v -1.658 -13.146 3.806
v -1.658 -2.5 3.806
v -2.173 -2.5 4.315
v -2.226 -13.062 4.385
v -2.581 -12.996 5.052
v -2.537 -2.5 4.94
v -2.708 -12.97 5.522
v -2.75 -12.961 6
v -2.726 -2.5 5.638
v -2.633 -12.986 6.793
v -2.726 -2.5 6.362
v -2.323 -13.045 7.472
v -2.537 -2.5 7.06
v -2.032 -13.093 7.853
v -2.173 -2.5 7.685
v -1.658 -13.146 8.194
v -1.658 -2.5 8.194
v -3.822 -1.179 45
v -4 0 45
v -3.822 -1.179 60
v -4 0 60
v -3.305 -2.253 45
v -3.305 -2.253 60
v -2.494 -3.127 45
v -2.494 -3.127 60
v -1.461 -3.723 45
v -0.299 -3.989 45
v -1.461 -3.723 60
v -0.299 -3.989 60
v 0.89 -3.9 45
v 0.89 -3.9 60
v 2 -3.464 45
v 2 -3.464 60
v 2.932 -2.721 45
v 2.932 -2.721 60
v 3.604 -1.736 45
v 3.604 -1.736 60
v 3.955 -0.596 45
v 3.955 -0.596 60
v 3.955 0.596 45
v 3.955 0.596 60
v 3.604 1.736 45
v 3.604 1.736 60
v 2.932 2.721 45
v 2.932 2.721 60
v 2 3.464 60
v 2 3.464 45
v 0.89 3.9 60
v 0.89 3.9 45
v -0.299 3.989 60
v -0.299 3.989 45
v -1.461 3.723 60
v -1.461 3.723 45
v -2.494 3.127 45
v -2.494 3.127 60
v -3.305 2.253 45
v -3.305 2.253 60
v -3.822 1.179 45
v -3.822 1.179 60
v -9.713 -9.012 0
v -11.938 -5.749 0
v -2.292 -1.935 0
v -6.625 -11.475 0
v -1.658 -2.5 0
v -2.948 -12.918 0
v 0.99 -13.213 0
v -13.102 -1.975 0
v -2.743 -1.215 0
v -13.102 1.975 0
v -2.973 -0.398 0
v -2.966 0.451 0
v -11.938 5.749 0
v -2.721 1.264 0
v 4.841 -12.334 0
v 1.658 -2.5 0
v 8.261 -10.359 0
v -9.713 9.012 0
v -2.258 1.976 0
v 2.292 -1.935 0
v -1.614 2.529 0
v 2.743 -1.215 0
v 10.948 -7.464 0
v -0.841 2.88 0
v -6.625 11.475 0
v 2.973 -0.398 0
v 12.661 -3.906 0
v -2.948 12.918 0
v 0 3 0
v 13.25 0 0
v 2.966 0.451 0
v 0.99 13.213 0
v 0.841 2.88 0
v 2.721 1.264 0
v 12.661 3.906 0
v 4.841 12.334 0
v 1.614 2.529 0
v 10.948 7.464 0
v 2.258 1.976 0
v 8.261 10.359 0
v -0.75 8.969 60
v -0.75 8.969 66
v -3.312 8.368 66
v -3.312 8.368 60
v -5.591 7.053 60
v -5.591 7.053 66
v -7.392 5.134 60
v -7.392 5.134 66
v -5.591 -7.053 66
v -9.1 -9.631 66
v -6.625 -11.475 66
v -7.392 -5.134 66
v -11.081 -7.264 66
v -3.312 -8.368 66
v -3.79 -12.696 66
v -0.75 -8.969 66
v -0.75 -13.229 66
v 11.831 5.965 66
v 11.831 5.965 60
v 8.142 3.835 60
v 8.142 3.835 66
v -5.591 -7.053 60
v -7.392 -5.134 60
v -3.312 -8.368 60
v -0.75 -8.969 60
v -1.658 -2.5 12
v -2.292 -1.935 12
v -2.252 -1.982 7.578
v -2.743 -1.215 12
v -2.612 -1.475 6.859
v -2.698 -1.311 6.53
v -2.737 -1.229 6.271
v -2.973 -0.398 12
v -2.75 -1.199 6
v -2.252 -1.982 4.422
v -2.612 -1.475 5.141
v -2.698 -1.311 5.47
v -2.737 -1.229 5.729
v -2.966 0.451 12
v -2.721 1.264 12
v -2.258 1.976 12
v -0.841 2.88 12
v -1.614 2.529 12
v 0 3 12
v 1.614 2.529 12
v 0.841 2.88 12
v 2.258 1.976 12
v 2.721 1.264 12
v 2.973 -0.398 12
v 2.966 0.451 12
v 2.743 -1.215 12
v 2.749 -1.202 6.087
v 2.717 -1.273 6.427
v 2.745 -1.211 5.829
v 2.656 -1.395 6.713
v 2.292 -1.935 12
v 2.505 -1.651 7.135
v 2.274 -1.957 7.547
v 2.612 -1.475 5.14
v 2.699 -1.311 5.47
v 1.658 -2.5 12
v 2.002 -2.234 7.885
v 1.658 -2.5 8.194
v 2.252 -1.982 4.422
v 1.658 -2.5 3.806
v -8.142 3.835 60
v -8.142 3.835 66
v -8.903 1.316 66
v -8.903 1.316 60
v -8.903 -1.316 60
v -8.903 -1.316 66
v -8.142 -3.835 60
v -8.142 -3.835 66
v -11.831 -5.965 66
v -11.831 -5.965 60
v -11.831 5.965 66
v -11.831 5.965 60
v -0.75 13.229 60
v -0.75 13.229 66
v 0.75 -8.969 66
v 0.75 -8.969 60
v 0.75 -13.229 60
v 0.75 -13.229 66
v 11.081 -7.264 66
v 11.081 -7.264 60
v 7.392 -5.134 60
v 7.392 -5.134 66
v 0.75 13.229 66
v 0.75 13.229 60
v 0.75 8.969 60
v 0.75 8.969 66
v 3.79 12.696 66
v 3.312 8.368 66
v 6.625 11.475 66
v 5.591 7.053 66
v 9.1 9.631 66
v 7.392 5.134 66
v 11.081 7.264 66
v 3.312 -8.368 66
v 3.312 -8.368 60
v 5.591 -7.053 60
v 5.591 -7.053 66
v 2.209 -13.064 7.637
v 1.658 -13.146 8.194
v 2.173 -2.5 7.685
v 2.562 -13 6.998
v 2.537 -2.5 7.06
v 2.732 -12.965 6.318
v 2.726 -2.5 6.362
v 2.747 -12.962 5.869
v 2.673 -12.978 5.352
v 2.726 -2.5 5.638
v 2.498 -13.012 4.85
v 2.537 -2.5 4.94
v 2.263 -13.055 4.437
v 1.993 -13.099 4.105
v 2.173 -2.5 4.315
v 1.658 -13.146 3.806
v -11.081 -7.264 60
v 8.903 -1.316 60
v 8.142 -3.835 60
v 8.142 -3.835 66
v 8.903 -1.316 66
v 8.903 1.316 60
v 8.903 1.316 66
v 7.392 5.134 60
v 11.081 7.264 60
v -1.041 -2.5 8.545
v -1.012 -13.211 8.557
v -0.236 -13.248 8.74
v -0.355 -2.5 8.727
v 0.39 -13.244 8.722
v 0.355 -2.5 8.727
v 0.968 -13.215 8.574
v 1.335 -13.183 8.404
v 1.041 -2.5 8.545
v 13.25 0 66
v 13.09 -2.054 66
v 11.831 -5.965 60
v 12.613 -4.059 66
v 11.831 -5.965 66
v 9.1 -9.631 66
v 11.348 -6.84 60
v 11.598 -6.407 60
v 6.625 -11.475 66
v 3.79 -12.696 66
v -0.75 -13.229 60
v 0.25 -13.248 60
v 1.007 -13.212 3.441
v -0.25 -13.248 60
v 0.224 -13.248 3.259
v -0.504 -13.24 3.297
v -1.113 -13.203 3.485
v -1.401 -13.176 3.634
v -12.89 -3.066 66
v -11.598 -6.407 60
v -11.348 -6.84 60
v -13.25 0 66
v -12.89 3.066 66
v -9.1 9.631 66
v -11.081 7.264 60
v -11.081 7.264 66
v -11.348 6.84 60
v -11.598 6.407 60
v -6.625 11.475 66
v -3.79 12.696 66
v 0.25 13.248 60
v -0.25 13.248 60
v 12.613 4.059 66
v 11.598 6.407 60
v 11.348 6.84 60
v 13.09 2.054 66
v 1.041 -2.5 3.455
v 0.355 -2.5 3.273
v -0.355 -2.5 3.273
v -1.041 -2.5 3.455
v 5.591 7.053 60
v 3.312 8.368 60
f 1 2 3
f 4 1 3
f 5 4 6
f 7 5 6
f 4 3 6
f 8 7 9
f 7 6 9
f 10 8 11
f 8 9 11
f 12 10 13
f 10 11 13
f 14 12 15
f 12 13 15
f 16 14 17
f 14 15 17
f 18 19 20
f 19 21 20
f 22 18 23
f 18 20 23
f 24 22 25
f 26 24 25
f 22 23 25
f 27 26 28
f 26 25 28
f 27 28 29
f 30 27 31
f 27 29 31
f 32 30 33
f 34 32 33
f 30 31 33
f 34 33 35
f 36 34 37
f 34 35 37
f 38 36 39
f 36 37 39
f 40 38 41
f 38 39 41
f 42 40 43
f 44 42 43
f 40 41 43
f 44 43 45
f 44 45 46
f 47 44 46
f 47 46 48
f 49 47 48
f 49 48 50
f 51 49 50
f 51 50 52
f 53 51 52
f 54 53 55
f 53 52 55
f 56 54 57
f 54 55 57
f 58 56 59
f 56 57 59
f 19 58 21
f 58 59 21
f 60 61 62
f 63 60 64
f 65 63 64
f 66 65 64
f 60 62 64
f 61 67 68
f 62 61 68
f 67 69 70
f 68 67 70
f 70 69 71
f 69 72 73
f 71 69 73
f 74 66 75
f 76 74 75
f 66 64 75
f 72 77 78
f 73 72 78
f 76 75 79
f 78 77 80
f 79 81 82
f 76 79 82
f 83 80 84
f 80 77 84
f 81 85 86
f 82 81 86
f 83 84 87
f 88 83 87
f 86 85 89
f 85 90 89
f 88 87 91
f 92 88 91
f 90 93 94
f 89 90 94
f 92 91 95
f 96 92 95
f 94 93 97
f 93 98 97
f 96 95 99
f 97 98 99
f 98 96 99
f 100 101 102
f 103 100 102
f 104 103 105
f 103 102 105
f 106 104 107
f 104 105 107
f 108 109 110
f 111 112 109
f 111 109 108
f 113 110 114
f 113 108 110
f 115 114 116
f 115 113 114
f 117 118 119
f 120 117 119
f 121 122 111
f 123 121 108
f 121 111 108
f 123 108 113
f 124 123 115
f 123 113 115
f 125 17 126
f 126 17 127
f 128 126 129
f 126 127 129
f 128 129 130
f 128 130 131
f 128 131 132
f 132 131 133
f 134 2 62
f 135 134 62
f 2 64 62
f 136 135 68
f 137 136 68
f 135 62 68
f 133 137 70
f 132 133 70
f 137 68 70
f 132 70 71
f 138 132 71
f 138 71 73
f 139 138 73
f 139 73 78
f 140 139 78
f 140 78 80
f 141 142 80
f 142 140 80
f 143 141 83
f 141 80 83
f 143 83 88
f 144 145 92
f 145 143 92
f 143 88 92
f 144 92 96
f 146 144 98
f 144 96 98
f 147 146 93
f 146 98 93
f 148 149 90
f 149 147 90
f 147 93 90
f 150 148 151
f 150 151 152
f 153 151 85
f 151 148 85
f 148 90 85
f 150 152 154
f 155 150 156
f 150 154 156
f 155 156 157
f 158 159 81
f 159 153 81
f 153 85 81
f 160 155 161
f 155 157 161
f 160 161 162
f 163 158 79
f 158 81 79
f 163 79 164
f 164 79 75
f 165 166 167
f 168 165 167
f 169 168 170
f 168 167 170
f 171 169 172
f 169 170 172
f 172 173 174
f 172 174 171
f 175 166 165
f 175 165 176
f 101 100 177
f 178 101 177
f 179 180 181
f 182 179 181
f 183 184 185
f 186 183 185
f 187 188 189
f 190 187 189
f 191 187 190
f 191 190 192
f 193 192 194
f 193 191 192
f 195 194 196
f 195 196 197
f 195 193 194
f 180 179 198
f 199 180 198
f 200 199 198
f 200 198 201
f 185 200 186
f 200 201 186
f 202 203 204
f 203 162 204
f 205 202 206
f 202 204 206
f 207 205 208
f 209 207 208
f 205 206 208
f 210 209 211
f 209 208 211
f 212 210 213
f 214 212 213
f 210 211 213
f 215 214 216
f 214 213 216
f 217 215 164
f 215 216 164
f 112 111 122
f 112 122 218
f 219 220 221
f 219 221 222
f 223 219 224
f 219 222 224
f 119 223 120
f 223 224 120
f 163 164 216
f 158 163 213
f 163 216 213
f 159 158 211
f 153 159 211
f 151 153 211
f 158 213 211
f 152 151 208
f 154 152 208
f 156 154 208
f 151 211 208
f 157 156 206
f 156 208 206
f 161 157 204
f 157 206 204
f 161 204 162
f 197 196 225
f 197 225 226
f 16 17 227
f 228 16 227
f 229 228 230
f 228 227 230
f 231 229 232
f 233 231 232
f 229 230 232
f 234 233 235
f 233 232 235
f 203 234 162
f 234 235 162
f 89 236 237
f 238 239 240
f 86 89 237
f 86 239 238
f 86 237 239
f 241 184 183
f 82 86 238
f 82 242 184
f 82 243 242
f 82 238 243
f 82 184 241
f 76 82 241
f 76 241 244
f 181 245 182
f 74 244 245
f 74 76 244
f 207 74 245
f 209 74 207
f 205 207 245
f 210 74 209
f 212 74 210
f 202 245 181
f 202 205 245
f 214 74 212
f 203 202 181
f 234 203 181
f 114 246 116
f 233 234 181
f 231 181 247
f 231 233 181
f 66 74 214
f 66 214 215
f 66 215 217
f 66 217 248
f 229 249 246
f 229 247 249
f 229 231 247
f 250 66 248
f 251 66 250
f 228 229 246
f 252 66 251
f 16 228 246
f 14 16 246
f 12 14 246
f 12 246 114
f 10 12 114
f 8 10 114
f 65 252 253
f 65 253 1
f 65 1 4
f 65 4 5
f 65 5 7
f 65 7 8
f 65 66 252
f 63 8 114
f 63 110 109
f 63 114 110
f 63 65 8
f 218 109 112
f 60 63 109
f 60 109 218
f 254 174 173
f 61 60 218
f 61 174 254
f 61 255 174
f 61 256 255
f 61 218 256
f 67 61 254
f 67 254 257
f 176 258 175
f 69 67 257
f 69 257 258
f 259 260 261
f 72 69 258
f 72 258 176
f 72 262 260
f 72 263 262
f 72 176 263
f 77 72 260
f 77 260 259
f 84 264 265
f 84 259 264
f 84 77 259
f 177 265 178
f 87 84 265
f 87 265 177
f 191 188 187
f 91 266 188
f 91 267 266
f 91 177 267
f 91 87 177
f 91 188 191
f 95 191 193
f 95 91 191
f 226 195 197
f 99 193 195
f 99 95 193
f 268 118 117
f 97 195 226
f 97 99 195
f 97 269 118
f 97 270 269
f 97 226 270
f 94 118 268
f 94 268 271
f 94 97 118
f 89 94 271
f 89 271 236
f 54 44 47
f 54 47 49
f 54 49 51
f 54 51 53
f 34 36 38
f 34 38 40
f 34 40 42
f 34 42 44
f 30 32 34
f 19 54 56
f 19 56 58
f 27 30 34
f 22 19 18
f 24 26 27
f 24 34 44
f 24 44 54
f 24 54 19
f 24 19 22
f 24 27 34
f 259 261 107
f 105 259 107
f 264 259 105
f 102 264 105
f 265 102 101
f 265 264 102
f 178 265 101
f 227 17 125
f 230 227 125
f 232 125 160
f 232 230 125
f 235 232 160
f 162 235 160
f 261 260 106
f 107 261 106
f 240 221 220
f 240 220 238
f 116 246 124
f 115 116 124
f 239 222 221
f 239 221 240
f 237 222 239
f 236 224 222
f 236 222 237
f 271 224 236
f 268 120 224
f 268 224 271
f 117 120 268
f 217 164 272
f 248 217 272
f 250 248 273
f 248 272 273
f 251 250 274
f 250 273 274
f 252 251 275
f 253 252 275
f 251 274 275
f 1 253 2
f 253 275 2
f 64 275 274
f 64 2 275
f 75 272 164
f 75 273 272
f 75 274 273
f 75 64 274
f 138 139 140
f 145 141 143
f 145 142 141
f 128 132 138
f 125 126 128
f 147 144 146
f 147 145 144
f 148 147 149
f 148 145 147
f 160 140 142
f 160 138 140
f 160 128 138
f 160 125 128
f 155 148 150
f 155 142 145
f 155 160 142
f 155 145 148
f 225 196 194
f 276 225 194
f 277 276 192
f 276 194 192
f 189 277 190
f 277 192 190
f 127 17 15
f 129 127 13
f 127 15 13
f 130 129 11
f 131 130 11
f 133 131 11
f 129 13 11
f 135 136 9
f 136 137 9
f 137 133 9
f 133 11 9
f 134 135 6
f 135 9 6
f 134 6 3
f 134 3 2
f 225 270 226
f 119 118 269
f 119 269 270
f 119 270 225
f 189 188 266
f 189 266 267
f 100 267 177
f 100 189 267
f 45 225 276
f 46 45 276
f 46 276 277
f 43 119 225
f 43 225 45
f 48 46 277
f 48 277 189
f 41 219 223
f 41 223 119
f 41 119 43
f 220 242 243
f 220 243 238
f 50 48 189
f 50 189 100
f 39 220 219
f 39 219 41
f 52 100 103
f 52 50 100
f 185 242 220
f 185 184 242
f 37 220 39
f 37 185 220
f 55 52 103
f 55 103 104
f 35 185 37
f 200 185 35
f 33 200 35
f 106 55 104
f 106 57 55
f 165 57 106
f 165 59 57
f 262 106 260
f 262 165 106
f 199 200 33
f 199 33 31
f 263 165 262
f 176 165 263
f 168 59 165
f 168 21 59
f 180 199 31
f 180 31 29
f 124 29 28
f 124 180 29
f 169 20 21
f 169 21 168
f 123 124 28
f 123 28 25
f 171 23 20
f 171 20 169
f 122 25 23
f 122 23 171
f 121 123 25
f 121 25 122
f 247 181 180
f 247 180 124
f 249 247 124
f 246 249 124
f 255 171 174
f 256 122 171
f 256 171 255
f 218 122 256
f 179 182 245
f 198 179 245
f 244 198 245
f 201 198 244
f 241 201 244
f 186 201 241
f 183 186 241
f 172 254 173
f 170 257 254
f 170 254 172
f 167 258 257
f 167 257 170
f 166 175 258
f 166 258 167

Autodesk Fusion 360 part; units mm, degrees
sketch "Skizze1" plane through (0, 0, 0) normal (0, 0, 1) x (1, 0, 0)
  circle A0 centre (0, 0) radius 13.25
  dimension "d1" = 26.5
extrude "Extrusion1" add sketch "Skizze1" along normal blind 66
sketch "Skizze2" plane through (0, 0, 66) normal (0, 0, 1) x (-1, 0, 0)
  circle A0 centre (0, 0) radius 13.25
  circle A1 centre (0, 0) radius 9
  line L0 (0.75, -14.5) -> (-0.75, -14.5)
  line L1 (-0.75, -14.5) -> (-0.75, -8.5)
  line L2 (-0.75, -8.5) -> (0.75, -8.5)
  line L3 (0.75, -8.5) -> (0.75, -14.5)
  line L4 (12.1824, -7.8995) -> (6.9862, -4.8995)
  line L5 (12.9324, -6.6005) -> (12.1824, -7.8995)
  line L6 (7.7362, -3.6005) -> (12.9324, -6.6005)
  line L7 (6.9862, -4.8995) -> (7.7362, -3.6005)
  line L8 (12.9324, 6.6005) -> (7.7362, 3.6005)
  line L9 (12.1824, 7.8995) -> (12.9324, 6.6005)
  line L10 (6.9862, 4.8995) -> (12.1824, 7.8995)
  line L11 (7.7362, 3.6005) -> (6.9862, 4.8995)
  line L12 (0.75, 14.5) -> (0.75, 8.5)
  line L13 (-0.75, 14.5) -> (0.75, 14.5)
  line L14 (-0.75, 8.5) -> (-0.75, 14.5)
  line L15 (0.75, 8.5) -> (-0.75, 8.5)
  line L16 (-12.1824, 7.8995) -> (-6.9862, 4.8995)
  line L17 (-12.9324, 6.6005) -> (-12.1824, 7.8995)
  line L18 (-7.7362, 3.6005) -> (-12.9324, 6.6005)
  line L19 (-6.9862, 4.8995) -> (-7.7362, 3.6005)
  line L20 (-12.9324, -6.6005) -> (-7.7362, -3.6005)
  line L21 (-12.1824, -7.8995) -> (-12.9324, -6.6005)
  line L22 (-6.9862, -4.8995) -> (-12.1824, -7.8995)
  line L23 (-7.7362, -3.6005) -> (-6.9862, -4.8995)
  dimension "d4" = 18
  dimension "d5" = 1.5
  dimension "d6" = 6
  dimension "d7" = 0.75
  dimension "d8" = 8.5
  dimension "d10" = 360
extrude "Extrusion2" cut sketch "Skizze2" against normal blind 6 contours A0 A1 L8 L10 | A0 A1 L4 L6 | A1 L8 L10 L11 | A1 L1 L2 L3 L4 L6 L7 L8 L10 L11 L12 L14 L15 L16 L18 L19 L20 L22 L23 | A1 L4 L6 L7 | A0 A1 L12 L14 | A0 A1 L1 L3 | A1 L12 L14 L15 | A1 L1 L2 L3 | A0 A1 L16 L18 | A0 A1 L20 L22 | A1 L16 L18 L19 | A1 L20 L22 L23
sketch "Skizze3" plane through (0, 0, 60) normal (0, 0, 1) x (-1, 0, 0)
  arc A0 (-11.8314, -5.9649) -> (-11.0814, -7.2639) centre (0, 0) ccw
  line L0 (-11.0814, -7.2639) -> (-7.3921, -5.1339)
  arc A1 (-7.3921, -5.1339) -> (-0.75, -8.9687) centre (0, 0) ccw
  line L1 (-0.75, -8.9687) -> (-0.75, -13.2288)
  arc A2 (-0.75, -13.2288) -> (0.75, -13.2288) centre (0, 0) ccw
  line L2 (0.75, -13.2288) -> (0.75, -8.9687)
  arc A3 (0.75, -8.9687) -> (7.3921, -5.1339) centre (0, 0) ccw
  line L3 (7.3921, -5.1339) -> (11.0814, -7.2639)
  arc A4 (11.0814, -7.2639) -> (11.8314, -5.9649) centre (0, 0) ccw
  line L4 (11.8314, -5.9649) -> (8.1421, -3.8348)
  arc A5 (8.1421, -3.8348) -> (8.1421, 3.8348) centre (0, 0) ccw
  line L5 (8.1421, 3.8348) -> (11.8314, 5.9649)
  arc A6 (11.8314, 5.9649) -> (11.0814, 7.2639) centre (0, 0) ccw
  line L6 (11.0814, 7.2639) -> (7.3921, 5.1339)
  arc A7 (7.3921, 5.1339) -> (0.75, 8.9687) centre (0, 0) ccw
  line L7 (0.75, 8.9687) -> (0.75, 13.2288)
  arc A8 (0.75, 13.2288) -> (-0.75, 13.2288) centre (0, 0) ccw
  line L8 (-0.75, 13.2288) -> (-0.75, 8.9687)
  arc A9 (-0.75, 8.9687) -> (-7.3921, 5.1339) centre (0, 0) ccw
  line L9 (-7.3921, 5.1339) -> (-11.0814, 7.2639)
  arc A10 (-11.0814, 7.2639) -> (-11.8314, 5.9649) centre (0, 0) ccw
  line L10 (-11.8314, 5.9649) -> (-8.1421, 3.8348)
  arc A11 (-8.1421, 3.8348) -> (-8.1421, -3.8348) centre (0, 0) ccw
  line L11 (-8.1421, -3.8348) -> (-11.8314, -5.9649)
  circle A12 centre (0, 0) radius 4
  dimension "d13" = 8
extrude "Extrusion3" cut sketch "Skizze3" against normal blind 15 contours A12
sketch "Skizze4" plane through (0, 0, 0) normal (0, 0, -1) x (1, 0, 0)
  circle A0 centre (0, 0) radius 13.25
  circle A1 centre (0, 0) radius 3
  line L0 (-1.6583, 2.5) -> (1.6583, 2.5)
  dimension "d16" = 6
  dimension "d17" = 2.5
extrude "Extrusion4" cut sketch "Skizze4" against normal blind 12 contours A1 L0 picked at (0.6261, 0.5577)
sketch "Skizze5" plane through (0, -2.5, 0) normal (0, 1, 0) x (-1, 0, 0)
  line L0 (-1.6583, 0) -> (1.6583, 0)
  line L1 (1.6583, 0) -> (1.6583, 12)
  line L2 (1.6583, 12) -> (-1.6583, 12)
  line L3 (-1.6583, 12) -> (-1.6583, 0)
  circle A0 centre (0, 6) radius 2.75
  dimension "d20" = 5.5
  dimension "d21" = 6
extrude "Extrusion5" cut sketch "Skizze5" along normal blind 3 contours L3 A0 | L1 L3 A0 | L1 A0
sketch "Skizze6" plane through (0, -2.5, 0) normal (0, 1, 0) x (-1, 0, 0)
  line L0 (1.6583, 8.1937) -> (1.6583, 12)
  line L1 (1.6583, 12) -> (-1.6583, 12)
  line L2 (-1.6583, 12) -> (-1.6583, 8.1937)
  arc A0 (-1.6583, 8.1937) -> (-1.6583, 3.8063) centre (0, 6) ccw
  line L3 (-1.6583, 3.8063) -> (-1.6583, 0)
  line L4 (-1.6583, 0) -> (1.6583, 0)
  line L5 (1.6583, 0) -> (1.6583, 3.8063)
  arc A1 (1.6583, 3.8063) -> (1.6583, 8.1937) centre (0, 6) ccw
  circle A2 centre (0, 6) radius 2.75
  dimension "d24" = 5.5
extrude "Extrusion6" cut sketch "Skizze6" against normal blind 15 contours A0 A1 A2
